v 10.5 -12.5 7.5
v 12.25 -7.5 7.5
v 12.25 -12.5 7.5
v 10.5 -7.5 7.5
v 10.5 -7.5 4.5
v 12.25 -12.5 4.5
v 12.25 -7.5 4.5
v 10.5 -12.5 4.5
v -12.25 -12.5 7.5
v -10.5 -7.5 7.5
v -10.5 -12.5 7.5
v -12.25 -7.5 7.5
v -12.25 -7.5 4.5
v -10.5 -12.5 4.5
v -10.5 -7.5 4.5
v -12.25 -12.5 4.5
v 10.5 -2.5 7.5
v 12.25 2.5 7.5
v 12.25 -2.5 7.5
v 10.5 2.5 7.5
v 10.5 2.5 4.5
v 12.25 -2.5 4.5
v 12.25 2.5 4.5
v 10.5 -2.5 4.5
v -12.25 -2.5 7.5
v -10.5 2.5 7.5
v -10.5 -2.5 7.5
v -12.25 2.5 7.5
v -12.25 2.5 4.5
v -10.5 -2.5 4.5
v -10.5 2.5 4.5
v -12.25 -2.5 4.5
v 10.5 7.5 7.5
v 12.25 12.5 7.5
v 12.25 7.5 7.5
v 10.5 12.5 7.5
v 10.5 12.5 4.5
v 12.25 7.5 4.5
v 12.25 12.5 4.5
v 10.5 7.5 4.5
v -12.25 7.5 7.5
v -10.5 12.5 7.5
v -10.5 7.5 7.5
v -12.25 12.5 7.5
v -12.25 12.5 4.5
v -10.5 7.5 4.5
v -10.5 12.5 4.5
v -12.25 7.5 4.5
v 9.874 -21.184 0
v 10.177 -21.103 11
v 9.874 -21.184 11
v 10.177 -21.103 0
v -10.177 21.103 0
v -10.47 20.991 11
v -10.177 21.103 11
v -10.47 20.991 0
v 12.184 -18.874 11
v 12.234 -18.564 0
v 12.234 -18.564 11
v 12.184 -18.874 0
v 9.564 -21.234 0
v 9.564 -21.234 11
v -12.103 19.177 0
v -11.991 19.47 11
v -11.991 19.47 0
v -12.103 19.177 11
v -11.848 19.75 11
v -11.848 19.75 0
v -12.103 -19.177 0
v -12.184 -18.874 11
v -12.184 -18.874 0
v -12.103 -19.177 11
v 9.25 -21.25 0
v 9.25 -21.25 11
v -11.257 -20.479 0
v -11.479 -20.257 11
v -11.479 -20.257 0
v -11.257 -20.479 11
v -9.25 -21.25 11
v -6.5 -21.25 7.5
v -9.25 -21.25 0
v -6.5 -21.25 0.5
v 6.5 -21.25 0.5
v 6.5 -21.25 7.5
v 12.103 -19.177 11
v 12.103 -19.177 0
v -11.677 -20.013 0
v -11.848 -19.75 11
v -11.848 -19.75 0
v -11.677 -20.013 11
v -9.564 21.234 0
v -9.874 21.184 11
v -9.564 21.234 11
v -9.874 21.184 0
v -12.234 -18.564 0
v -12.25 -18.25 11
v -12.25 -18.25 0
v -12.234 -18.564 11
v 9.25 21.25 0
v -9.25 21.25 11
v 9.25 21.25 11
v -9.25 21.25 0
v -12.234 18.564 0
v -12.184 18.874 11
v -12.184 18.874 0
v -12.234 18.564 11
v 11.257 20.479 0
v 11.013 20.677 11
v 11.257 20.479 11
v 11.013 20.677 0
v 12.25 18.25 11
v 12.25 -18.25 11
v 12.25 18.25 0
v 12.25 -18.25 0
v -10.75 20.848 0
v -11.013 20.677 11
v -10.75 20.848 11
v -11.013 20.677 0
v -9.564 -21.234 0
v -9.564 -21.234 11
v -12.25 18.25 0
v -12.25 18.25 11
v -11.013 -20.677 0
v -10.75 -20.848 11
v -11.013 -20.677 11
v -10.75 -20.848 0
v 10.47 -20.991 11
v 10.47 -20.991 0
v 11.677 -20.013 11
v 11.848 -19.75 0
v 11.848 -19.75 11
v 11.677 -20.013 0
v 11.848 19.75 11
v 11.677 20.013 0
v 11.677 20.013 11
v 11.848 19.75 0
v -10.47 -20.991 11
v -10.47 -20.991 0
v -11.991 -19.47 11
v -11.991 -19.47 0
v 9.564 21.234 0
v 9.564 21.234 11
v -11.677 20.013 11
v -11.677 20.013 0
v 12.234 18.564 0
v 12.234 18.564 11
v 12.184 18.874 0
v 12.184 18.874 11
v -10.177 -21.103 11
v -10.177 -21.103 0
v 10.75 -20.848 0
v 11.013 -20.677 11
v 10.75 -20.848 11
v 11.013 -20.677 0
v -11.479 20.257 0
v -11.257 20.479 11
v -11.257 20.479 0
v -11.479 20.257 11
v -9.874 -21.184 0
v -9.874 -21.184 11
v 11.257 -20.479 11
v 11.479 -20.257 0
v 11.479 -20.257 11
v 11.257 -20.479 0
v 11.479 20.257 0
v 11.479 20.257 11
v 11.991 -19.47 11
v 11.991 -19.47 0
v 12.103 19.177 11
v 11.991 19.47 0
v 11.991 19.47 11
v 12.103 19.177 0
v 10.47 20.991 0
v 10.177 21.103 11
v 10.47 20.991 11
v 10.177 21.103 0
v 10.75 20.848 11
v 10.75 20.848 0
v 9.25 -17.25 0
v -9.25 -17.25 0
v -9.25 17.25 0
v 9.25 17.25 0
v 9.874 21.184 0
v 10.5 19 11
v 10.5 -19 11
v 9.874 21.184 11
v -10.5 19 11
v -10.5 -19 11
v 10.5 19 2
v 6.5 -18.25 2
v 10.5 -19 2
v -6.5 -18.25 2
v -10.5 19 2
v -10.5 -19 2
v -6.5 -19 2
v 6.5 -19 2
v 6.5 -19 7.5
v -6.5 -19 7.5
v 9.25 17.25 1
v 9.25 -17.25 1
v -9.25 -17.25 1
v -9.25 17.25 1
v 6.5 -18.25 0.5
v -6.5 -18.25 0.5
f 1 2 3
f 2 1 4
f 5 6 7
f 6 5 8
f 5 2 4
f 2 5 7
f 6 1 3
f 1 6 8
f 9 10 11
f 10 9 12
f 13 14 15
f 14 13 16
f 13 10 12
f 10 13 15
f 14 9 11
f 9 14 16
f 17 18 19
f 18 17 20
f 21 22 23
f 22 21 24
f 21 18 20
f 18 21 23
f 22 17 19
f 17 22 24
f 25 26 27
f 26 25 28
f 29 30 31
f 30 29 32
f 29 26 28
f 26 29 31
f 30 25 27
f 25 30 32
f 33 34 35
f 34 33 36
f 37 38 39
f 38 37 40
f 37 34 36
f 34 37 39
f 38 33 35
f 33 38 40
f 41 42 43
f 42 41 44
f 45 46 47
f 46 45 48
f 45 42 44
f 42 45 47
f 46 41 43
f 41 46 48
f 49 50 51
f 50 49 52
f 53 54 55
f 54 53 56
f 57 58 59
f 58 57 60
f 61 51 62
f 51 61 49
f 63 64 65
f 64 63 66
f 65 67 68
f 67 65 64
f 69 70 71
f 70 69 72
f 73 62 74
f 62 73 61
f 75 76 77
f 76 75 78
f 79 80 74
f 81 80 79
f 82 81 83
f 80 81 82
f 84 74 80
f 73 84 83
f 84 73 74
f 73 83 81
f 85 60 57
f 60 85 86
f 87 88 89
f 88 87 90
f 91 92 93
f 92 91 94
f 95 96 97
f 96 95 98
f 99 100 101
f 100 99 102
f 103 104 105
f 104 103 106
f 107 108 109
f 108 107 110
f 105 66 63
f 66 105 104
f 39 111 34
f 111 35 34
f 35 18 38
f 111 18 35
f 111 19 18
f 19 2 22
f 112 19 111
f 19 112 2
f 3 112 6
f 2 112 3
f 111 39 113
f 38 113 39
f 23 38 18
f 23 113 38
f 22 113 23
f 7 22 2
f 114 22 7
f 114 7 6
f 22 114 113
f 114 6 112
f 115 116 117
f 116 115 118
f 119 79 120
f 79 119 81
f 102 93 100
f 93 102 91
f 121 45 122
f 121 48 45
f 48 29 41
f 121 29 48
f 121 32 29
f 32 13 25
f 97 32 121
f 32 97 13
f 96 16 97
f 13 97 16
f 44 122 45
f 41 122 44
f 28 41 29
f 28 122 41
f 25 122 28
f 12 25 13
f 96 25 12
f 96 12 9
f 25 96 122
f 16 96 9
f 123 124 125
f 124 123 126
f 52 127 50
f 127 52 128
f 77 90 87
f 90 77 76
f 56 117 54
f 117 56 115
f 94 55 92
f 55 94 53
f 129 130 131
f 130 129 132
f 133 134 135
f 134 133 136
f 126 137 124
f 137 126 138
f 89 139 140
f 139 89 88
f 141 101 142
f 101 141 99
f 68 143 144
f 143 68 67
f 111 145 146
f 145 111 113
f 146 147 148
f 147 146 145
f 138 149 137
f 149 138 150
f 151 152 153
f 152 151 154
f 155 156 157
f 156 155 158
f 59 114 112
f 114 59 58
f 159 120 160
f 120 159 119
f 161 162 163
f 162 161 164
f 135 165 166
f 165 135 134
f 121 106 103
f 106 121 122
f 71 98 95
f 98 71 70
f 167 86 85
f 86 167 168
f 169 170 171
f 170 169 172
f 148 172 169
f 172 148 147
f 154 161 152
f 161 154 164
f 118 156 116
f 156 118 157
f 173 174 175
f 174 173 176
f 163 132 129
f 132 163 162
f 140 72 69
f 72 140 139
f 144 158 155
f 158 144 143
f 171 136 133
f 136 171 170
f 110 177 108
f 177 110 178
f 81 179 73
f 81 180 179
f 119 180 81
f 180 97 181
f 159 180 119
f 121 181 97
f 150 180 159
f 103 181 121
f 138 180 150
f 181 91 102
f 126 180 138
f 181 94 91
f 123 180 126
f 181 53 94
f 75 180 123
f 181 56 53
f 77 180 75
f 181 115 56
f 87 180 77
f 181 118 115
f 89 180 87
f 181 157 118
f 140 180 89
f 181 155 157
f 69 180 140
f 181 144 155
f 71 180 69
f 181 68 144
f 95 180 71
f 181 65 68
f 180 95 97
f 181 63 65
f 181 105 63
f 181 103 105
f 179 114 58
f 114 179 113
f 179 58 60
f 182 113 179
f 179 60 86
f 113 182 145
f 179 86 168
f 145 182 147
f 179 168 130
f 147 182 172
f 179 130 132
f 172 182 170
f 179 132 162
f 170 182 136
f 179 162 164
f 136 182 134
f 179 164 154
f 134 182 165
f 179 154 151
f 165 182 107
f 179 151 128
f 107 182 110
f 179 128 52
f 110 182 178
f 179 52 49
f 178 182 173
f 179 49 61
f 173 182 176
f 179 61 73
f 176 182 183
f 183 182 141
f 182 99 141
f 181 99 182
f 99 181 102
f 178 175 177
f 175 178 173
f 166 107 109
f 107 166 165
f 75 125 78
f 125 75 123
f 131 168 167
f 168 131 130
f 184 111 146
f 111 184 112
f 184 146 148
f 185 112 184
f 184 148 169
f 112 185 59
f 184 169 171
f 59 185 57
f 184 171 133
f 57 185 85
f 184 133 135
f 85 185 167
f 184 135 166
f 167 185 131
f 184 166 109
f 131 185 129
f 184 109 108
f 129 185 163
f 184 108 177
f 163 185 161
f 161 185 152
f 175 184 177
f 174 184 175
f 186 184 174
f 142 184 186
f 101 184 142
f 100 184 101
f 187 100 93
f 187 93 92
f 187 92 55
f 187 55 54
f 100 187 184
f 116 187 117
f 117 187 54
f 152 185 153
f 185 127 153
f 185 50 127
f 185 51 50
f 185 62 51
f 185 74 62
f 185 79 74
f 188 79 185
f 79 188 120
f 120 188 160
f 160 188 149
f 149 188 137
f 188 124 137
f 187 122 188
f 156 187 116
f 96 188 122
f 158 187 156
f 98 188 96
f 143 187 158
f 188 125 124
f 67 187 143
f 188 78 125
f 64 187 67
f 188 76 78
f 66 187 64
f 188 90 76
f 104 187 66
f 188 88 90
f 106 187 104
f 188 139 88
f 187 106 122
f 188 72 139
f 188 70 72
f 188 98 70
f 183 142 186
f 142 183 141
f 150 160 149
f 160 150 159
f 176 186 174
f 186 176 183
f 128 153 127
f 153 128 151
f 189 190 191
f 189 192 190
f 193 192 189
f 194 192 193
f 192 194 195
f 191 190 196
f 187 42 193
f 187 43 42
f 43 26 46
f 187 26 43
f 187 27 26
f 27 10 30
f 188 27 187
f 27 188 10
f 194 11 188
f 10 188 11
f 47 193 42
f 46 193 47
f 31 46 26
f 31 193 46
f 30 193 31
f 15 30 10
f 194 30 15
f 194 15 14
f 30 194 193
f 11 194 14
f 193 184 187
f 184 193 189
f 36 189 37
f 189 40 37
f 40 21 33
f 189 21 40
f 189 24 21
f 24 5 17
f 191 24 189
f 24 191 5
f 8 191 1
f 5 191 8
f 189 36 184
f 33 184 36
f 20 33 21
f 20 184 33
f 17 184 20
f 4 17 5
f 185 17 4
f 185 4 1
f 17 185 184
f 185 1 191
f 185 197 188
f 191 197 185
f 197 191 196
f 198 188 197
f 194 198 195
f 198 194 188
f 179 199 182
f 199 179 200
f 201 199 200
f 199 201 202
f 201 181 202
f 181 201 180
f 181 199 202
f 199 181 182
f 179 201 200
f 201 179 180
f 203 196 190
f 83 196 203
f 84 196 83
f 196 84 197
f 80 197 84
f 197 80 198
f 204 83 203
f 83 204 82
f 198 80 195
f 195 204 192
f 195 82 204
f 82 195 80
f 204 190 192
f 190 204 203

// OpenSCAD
// --- Case Enclosure v11 ---
board_l = 37.0;    
board_w = 20.0;    
board_h = 8.0;     
wall = 2.0;        
corner_r = 3.0; // Standard radius for all corners

lcd_w = 18.5; 
lcd_l = 34.5;

case_w = board_w + (wall * 2) + 0.5; 
case_l = board_l + (wall * 2) + 1.5; 
case_h = board_h + wall + 1.0; 

$fn = 60;

difference() {
    // Outer Shell
    linear_extrude(case_h)
        offset(r = corner_r) square([case_w - 2*corner_r, case_l - 2*corner_r], center=true);
    
    // Internal Cavity
    translate([0, 0, wall])
        linear_extrude(case_h)
            square([board_w + 1.0, board_l + 1.0], center=true);
    
    // Front LCD Window
    translate([0, 0, -1])
        cube([lcd_w, lcd_l, wall + 2], center=true);
        
    // USB-C Port (Lowered)
    translate([0, -case_l/2, wall + (board_h/2) - 2]) 
        cube([13, wall*3, 7], center=true);

    // Lateral Vents
    for (i = [-10, 0, 10]) {
        translate([case_w/2, i, wall + (board_h/2)])
            cube([wall*3, 5, 3], center=true);
        translate([-case_w/2, i, wall + (board_h/2)])
            cube([wall*3, 5, 3], center=true);
    }
}
